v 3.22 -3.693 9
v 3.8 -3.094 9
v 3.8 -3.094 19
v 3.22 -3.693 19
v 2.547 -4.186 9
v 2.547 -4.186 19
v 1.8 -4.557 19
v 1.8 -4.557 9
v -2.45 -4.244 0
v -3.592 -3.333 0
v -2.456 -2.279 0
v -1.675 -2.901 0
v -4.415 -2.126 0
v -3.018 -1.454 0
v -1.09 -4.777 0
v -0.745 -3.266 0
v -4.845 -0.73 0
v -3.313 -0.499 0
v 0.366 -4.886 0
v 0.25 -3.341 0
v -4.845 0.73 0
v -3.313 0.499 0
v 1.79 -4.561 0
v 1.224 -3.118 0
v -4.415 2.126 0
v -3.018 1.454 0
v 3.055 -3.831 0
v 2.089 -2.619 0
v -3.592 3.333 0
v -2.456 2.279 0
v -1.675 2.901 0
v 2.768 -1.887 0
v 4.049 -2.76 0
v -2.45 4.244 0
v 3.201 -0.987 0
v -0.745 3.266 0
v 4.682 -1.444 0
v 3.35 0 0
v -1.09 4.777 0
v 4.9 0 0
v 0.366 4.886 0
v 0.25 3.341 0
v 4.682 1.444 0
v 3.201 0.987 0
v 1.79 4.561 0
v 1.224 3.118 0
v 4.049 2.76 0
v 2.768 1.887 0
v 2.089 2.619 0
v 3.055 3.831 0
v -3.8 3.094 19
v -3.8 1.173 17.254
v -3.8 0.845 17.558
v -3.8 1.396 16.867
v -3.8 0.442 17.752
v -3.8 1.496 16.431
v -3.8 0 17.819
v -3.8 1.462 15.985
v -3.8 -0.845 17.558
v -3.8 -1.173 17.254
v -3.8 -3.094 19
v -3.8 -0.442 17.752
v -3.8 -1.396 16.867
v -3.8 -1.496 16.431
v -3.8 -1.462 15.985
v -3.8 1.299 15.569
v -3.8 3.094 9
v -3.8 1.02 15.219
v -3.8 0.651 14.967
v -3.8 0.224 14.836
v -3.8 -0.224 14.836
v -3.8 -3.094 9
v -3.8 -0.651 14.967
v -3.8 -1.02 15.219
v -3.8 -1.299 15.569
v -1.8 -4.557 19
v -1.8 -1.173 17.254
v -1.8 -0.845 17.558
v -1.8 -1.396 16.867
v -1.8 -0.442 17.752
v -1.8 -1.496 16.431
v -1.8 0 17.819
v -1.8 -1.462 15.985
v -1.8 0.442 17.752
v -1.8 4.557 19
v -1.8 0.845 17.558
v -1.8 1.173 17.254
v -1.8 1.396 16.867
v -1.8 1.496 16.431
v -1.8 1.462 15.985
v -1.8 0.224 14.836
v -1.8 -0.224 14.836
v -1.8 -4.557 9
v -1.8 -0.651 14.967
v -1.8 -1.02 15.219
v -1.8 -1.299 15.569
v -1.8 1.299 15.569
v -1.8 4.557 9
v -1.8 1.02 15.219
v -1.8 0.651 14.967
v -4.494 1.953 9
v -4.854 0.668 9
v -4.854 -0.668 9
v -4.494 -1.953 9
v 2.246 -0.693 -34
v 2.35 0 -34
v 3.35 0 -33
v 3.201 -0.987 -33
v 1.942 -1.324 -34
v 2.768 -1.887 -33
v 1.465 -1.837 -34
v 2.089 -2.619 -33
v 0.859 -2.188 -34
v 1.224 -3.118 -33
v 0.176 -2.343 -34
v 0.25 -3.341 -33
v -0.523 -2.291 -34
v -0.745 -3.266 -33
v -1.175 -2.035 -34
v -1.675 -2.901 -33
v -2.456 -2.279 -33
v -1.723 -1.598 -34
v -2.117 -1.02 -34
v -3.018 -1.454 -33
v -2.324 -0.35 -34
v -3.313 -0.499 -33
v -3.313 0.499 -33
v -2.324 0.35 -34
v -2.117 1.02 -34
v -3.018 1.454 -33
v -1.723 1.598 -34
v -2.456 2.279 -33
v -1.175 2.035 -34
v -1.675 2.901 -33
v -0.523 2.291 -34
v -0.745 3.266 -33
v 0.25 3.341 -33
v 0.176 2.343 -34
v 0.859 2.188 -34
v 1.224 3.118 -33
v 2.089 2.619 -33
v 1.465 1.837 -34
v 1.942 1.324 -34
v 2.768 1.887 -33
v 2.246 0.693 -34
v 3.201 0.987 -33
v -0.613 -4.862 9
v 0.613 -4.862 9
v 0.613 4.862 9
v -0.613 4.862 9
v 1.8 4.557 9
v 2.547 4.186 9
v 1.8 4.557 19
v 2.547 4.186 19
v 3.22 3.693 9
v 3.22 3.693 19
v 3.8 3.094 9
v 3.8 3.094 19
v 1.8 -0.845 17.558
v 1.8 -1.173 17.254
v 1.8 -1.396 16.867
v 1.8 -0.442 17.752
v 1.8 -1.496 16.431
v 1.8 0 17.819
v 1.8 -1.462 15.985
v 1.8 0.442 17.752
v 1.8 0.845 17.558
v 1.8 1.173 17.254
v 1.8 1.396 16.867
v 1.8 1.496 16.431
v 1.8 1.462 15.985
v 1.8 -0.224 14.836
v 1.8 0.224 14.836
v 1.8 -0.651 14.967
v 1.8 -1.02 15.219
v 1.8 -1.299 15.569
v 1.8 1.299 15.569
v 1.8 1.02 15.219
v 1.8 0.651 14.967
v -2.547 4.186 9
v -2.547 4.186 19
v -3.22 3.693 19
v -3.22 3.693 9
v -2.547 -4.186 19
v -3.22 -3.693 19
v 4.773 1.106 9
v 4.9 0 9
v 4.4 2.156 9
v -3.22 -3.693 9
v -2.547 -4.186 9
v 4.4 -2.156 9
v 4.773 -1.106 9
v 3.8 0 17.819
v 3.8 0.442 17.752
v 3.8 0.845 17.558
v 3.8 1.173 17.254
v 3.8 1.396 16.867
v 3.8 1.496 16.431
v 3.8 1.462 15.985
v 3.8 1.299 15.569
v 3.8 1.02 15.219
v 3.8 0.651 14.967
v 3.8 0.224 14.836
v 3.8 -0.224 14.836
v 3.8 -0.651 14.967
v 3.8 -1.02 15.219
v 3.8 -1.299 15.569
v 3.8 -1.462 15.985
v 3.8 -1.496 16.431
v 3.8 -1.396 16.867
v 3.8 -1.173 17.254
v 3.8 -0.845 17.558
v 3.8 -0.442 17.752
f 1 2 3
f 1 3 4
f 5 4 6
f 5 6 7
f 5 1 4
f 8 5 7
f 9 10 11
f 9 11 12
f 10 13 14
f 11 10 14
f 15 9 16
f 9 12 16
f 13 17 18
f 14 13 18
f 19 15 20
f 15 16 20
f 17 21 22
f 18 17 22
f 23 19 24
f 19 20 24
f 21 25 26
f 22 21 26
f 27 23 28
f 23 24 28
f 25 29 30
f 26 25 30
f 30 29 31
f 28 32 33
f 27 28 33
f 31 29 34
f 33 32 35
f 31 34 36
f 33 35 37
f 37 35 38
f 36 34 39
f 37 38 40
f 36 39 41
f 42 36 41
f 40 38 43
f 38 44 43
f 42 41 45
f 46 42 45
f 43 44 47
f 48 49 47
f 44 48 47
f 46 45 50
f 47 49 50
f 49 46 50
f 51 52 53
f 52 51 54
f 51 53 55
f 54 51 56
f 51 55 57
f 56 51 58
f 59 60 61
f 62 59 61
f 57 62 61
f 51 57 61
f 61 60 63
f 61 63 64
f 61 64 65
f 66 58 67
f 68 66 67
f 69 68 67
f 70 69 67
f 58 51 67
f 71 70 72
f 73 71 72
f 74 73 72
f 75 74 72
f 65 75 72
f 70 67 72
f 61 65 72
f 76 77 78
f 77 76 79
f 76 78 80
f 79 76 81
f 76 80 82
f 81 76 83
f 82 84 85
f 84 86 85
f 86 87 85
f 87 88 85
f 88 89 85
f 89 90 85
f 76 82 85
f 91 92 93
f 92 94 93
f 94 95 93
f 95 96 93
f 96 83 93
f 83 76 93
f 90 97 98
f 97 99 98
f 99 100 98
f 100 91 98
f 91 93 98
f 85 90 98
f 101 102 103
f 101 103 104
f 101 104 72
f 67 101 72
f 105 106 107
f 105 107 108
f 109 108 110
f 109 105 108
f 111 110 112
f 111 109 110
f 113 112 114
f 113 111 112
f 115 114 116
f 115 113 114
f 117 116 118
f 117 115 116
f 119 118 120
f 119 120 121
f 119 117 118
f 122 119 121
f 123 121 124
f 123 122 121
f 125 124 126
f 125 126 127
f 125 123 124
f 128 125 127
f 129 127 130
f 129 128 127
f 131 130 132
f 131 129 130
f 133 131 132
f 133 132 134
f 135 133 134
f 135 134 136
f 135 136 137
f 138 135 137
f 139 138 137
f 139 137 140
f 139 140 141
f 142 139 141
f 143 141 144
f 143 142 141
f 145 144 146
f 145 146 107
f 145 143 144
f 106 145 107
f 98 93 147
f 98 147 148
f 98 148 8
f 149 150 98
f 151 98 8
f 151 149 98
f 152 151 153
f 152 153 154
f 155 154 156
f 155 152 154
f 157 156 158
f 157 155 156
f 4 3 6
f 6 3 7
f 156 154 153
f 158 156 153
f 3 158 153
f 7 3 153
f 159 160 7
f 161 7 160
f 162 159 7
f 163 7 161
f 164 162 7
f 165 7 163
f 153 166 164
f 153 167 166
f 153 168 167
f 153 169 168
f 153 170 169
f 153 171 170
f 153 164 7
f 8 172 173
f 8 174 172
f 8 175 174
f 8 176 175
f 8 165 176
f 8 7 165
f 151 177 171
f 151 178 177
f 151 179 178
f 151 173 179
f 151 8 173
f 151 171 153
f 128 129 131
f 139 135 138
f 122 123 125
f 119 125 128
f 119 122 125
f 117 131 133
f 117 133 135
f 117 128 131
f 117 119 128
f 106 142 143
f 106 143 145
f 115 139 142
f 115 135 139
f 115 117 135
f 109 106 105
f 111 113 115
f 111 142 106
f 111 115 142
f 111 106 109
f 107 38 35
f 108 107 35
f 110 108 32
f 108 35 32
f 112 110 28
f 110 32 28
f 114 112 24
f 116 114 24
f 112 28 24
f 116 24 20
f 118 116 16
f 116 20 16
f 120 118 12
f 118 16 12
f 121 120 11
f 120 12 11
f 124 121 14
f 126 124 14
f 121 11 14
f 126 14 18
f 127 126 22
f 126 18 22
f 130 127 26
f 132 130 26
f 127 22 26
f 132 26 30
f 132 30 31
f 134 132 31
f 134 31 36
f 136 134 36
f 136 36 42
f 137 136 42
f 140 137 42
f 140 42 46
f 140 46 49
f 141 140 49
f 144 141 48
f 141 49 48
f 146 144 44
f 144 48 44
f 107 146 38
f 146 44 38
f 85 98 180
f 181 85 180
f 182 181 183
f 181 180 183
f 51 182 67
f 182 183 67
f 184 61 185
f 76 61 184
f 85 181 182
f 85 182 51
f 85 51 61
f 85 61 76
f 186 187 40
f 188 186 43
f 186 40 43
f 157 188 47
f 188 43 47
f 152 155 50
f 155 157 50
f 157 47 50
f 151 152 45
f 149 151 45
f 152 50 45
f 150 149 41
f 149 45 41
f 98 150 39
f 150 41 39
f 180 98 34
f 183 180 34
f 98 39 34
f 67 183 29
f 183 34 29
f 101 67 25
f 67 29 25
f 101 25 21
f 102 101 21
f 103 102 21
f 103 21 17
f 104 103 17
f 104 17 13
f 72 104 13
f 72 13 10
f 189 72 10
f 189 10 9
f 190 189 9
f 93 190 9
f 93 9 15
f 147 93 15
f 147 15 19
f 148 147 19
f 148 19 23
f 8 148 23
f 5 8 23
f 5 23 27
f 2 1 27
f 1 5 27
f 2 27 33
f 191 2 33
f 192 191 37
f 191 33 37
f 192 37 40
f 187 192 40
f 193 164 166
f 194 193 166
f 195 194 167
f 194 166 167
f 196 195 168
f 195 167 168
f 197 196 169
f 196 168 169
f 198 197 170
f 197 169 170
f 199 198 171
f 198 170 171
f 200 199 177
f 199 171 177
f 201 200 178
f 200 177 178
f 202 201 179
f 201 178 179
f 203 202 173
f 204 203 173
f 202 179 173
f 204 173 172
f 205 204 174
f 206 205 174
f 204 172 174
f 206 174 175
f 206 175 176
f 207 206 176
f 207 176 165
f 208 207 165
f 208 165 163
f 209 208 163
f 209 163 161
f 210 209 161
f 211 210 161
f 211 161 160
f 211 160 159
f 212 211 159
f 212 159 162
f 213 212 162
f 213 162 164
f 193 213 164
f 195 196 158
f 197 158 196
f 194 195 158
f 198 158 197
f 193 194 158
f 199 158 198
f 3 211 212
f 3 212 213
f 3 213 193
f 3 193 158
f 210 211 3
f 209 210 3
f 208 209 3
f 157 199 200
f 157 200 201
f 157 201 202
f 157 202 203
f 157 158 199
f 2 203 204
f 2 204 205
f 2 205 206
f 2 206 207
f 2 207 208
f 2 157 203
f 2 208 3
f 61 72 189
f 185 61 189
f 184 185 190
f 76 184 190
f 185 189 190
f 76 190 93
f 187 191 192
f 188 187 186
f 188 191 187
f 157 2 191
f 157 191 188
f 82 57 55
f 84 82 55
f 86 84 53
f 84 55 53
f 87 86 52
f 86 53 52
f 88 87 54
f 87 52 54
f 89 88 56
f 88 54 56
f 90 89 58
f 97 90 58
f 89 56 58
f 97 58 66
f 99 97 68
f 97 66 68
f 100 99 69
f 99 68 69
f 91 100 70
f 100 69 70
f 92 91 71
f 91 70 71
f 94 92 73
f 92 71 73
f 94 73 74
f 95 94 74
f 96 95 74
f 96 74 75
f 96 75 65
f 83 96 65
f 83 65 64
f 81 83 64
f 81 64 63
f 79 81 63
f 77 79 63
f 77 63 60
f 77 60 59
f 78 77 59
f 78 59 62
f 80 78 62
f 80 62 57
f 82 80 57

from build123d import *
from build123d.topology import SkipClean

# Parameters (mm, degrees)
SKETCH_2_R          = 4.9
EXTRUDE_1_DEPTH     = 9
EXTRUDE_2_DEPTH     = 10
SKETCH_4_R          = 1.5
CUT_EXTRUDE_1_DEPTH = 22.46392322
SKETCH_5_R          = 3.35
EXTRUDE_3_DEPTH     = 34
CHAMFER_1_SIZE      = 1


with BuildPart() as part:
    # 草图2 → 凸台-拉伸1 (new body)
    with BuildSketch(Plane.XY):
        Circle(SKETCH_2_R)
    extrude(amount=EXTRUDE_1_DEPTH)

    # 草图3 → 凸台-拉伸2 (add)
    with SkipClean():  # the faces are left unmerged after this step: merging them gives an invalid solid
        with BuildSketch(Plane.XY.offset(9)):
            with BuildLine():
                Line((-1.8, -4.557411546), (-1.8, 4.557411546))
                ThreePointArc((-1.8, 4.557411546), (-2.894085134, 3.954019631), (-3.8, 3.09354166))
                Line((-3.8, 3.09354166), (-3.8, -3.09354166))
                ThreePointArc((-3.8, -3.09354166), (-2.894085134, -3.954019631), (-1.8, -4.557411546))
            make_face()
            with BuildLine():
                Line((1.8, -4.557411546), (1.8, 4.557411546))
                ThreePointArc((1.8, 4.557411546), (2.894085134, 3.954019631), (3.8, 3.09354166))
                Line((3.8, 3.09354166), (3.8, -3.09354166))
                ThreePointArc((3.8, -3.09354166), (2.894085134, -3.954019631), (1.8, -4.557411546))
            make_face()
        extrude(amount=EXTRUDE_2_DEPTH)

    # 草图4 → 切除-拉伸1 (cut, through all)
    with SkipClean():  # the faces are left unmerged after this step: merging them gives an invalid solid
        with BuildSketch(Plane.ZY.offset(3.8)):
            with Locations((16.318814586, 0)):
                Circle(SKETCH_4_R)
        extrude(amount=-CUT_EXTRUDE_1_DEPTH, mode=Mode.SUBTRACT)

    # 草图5 → 凸台-拉伸3 (add)
    with SkipClean():  # the faces are left unmerged after this step: merging them gives an invalid solid
        with BuildSketch(Plane(origin=(0, 0, 0), x_dir=(-1, 0, 0), z_dir=(0, 0, -1))):
            with Locations(Location((0, 0, 0), (0, 0, 180))):
                Circle(SKETCH_5_R)
        extrude(amount=EXTRUDE_3_DEPTH)

    # 倒角1
    chamfer_1_edges = [part.edges().sort_by_distance(p)[0] for p in [
        (-3.35, 0, -34),
    ]]
    chamfer(chamfer_1_edges, length=CHAMFER_1_SIZE)


solid = part.part
